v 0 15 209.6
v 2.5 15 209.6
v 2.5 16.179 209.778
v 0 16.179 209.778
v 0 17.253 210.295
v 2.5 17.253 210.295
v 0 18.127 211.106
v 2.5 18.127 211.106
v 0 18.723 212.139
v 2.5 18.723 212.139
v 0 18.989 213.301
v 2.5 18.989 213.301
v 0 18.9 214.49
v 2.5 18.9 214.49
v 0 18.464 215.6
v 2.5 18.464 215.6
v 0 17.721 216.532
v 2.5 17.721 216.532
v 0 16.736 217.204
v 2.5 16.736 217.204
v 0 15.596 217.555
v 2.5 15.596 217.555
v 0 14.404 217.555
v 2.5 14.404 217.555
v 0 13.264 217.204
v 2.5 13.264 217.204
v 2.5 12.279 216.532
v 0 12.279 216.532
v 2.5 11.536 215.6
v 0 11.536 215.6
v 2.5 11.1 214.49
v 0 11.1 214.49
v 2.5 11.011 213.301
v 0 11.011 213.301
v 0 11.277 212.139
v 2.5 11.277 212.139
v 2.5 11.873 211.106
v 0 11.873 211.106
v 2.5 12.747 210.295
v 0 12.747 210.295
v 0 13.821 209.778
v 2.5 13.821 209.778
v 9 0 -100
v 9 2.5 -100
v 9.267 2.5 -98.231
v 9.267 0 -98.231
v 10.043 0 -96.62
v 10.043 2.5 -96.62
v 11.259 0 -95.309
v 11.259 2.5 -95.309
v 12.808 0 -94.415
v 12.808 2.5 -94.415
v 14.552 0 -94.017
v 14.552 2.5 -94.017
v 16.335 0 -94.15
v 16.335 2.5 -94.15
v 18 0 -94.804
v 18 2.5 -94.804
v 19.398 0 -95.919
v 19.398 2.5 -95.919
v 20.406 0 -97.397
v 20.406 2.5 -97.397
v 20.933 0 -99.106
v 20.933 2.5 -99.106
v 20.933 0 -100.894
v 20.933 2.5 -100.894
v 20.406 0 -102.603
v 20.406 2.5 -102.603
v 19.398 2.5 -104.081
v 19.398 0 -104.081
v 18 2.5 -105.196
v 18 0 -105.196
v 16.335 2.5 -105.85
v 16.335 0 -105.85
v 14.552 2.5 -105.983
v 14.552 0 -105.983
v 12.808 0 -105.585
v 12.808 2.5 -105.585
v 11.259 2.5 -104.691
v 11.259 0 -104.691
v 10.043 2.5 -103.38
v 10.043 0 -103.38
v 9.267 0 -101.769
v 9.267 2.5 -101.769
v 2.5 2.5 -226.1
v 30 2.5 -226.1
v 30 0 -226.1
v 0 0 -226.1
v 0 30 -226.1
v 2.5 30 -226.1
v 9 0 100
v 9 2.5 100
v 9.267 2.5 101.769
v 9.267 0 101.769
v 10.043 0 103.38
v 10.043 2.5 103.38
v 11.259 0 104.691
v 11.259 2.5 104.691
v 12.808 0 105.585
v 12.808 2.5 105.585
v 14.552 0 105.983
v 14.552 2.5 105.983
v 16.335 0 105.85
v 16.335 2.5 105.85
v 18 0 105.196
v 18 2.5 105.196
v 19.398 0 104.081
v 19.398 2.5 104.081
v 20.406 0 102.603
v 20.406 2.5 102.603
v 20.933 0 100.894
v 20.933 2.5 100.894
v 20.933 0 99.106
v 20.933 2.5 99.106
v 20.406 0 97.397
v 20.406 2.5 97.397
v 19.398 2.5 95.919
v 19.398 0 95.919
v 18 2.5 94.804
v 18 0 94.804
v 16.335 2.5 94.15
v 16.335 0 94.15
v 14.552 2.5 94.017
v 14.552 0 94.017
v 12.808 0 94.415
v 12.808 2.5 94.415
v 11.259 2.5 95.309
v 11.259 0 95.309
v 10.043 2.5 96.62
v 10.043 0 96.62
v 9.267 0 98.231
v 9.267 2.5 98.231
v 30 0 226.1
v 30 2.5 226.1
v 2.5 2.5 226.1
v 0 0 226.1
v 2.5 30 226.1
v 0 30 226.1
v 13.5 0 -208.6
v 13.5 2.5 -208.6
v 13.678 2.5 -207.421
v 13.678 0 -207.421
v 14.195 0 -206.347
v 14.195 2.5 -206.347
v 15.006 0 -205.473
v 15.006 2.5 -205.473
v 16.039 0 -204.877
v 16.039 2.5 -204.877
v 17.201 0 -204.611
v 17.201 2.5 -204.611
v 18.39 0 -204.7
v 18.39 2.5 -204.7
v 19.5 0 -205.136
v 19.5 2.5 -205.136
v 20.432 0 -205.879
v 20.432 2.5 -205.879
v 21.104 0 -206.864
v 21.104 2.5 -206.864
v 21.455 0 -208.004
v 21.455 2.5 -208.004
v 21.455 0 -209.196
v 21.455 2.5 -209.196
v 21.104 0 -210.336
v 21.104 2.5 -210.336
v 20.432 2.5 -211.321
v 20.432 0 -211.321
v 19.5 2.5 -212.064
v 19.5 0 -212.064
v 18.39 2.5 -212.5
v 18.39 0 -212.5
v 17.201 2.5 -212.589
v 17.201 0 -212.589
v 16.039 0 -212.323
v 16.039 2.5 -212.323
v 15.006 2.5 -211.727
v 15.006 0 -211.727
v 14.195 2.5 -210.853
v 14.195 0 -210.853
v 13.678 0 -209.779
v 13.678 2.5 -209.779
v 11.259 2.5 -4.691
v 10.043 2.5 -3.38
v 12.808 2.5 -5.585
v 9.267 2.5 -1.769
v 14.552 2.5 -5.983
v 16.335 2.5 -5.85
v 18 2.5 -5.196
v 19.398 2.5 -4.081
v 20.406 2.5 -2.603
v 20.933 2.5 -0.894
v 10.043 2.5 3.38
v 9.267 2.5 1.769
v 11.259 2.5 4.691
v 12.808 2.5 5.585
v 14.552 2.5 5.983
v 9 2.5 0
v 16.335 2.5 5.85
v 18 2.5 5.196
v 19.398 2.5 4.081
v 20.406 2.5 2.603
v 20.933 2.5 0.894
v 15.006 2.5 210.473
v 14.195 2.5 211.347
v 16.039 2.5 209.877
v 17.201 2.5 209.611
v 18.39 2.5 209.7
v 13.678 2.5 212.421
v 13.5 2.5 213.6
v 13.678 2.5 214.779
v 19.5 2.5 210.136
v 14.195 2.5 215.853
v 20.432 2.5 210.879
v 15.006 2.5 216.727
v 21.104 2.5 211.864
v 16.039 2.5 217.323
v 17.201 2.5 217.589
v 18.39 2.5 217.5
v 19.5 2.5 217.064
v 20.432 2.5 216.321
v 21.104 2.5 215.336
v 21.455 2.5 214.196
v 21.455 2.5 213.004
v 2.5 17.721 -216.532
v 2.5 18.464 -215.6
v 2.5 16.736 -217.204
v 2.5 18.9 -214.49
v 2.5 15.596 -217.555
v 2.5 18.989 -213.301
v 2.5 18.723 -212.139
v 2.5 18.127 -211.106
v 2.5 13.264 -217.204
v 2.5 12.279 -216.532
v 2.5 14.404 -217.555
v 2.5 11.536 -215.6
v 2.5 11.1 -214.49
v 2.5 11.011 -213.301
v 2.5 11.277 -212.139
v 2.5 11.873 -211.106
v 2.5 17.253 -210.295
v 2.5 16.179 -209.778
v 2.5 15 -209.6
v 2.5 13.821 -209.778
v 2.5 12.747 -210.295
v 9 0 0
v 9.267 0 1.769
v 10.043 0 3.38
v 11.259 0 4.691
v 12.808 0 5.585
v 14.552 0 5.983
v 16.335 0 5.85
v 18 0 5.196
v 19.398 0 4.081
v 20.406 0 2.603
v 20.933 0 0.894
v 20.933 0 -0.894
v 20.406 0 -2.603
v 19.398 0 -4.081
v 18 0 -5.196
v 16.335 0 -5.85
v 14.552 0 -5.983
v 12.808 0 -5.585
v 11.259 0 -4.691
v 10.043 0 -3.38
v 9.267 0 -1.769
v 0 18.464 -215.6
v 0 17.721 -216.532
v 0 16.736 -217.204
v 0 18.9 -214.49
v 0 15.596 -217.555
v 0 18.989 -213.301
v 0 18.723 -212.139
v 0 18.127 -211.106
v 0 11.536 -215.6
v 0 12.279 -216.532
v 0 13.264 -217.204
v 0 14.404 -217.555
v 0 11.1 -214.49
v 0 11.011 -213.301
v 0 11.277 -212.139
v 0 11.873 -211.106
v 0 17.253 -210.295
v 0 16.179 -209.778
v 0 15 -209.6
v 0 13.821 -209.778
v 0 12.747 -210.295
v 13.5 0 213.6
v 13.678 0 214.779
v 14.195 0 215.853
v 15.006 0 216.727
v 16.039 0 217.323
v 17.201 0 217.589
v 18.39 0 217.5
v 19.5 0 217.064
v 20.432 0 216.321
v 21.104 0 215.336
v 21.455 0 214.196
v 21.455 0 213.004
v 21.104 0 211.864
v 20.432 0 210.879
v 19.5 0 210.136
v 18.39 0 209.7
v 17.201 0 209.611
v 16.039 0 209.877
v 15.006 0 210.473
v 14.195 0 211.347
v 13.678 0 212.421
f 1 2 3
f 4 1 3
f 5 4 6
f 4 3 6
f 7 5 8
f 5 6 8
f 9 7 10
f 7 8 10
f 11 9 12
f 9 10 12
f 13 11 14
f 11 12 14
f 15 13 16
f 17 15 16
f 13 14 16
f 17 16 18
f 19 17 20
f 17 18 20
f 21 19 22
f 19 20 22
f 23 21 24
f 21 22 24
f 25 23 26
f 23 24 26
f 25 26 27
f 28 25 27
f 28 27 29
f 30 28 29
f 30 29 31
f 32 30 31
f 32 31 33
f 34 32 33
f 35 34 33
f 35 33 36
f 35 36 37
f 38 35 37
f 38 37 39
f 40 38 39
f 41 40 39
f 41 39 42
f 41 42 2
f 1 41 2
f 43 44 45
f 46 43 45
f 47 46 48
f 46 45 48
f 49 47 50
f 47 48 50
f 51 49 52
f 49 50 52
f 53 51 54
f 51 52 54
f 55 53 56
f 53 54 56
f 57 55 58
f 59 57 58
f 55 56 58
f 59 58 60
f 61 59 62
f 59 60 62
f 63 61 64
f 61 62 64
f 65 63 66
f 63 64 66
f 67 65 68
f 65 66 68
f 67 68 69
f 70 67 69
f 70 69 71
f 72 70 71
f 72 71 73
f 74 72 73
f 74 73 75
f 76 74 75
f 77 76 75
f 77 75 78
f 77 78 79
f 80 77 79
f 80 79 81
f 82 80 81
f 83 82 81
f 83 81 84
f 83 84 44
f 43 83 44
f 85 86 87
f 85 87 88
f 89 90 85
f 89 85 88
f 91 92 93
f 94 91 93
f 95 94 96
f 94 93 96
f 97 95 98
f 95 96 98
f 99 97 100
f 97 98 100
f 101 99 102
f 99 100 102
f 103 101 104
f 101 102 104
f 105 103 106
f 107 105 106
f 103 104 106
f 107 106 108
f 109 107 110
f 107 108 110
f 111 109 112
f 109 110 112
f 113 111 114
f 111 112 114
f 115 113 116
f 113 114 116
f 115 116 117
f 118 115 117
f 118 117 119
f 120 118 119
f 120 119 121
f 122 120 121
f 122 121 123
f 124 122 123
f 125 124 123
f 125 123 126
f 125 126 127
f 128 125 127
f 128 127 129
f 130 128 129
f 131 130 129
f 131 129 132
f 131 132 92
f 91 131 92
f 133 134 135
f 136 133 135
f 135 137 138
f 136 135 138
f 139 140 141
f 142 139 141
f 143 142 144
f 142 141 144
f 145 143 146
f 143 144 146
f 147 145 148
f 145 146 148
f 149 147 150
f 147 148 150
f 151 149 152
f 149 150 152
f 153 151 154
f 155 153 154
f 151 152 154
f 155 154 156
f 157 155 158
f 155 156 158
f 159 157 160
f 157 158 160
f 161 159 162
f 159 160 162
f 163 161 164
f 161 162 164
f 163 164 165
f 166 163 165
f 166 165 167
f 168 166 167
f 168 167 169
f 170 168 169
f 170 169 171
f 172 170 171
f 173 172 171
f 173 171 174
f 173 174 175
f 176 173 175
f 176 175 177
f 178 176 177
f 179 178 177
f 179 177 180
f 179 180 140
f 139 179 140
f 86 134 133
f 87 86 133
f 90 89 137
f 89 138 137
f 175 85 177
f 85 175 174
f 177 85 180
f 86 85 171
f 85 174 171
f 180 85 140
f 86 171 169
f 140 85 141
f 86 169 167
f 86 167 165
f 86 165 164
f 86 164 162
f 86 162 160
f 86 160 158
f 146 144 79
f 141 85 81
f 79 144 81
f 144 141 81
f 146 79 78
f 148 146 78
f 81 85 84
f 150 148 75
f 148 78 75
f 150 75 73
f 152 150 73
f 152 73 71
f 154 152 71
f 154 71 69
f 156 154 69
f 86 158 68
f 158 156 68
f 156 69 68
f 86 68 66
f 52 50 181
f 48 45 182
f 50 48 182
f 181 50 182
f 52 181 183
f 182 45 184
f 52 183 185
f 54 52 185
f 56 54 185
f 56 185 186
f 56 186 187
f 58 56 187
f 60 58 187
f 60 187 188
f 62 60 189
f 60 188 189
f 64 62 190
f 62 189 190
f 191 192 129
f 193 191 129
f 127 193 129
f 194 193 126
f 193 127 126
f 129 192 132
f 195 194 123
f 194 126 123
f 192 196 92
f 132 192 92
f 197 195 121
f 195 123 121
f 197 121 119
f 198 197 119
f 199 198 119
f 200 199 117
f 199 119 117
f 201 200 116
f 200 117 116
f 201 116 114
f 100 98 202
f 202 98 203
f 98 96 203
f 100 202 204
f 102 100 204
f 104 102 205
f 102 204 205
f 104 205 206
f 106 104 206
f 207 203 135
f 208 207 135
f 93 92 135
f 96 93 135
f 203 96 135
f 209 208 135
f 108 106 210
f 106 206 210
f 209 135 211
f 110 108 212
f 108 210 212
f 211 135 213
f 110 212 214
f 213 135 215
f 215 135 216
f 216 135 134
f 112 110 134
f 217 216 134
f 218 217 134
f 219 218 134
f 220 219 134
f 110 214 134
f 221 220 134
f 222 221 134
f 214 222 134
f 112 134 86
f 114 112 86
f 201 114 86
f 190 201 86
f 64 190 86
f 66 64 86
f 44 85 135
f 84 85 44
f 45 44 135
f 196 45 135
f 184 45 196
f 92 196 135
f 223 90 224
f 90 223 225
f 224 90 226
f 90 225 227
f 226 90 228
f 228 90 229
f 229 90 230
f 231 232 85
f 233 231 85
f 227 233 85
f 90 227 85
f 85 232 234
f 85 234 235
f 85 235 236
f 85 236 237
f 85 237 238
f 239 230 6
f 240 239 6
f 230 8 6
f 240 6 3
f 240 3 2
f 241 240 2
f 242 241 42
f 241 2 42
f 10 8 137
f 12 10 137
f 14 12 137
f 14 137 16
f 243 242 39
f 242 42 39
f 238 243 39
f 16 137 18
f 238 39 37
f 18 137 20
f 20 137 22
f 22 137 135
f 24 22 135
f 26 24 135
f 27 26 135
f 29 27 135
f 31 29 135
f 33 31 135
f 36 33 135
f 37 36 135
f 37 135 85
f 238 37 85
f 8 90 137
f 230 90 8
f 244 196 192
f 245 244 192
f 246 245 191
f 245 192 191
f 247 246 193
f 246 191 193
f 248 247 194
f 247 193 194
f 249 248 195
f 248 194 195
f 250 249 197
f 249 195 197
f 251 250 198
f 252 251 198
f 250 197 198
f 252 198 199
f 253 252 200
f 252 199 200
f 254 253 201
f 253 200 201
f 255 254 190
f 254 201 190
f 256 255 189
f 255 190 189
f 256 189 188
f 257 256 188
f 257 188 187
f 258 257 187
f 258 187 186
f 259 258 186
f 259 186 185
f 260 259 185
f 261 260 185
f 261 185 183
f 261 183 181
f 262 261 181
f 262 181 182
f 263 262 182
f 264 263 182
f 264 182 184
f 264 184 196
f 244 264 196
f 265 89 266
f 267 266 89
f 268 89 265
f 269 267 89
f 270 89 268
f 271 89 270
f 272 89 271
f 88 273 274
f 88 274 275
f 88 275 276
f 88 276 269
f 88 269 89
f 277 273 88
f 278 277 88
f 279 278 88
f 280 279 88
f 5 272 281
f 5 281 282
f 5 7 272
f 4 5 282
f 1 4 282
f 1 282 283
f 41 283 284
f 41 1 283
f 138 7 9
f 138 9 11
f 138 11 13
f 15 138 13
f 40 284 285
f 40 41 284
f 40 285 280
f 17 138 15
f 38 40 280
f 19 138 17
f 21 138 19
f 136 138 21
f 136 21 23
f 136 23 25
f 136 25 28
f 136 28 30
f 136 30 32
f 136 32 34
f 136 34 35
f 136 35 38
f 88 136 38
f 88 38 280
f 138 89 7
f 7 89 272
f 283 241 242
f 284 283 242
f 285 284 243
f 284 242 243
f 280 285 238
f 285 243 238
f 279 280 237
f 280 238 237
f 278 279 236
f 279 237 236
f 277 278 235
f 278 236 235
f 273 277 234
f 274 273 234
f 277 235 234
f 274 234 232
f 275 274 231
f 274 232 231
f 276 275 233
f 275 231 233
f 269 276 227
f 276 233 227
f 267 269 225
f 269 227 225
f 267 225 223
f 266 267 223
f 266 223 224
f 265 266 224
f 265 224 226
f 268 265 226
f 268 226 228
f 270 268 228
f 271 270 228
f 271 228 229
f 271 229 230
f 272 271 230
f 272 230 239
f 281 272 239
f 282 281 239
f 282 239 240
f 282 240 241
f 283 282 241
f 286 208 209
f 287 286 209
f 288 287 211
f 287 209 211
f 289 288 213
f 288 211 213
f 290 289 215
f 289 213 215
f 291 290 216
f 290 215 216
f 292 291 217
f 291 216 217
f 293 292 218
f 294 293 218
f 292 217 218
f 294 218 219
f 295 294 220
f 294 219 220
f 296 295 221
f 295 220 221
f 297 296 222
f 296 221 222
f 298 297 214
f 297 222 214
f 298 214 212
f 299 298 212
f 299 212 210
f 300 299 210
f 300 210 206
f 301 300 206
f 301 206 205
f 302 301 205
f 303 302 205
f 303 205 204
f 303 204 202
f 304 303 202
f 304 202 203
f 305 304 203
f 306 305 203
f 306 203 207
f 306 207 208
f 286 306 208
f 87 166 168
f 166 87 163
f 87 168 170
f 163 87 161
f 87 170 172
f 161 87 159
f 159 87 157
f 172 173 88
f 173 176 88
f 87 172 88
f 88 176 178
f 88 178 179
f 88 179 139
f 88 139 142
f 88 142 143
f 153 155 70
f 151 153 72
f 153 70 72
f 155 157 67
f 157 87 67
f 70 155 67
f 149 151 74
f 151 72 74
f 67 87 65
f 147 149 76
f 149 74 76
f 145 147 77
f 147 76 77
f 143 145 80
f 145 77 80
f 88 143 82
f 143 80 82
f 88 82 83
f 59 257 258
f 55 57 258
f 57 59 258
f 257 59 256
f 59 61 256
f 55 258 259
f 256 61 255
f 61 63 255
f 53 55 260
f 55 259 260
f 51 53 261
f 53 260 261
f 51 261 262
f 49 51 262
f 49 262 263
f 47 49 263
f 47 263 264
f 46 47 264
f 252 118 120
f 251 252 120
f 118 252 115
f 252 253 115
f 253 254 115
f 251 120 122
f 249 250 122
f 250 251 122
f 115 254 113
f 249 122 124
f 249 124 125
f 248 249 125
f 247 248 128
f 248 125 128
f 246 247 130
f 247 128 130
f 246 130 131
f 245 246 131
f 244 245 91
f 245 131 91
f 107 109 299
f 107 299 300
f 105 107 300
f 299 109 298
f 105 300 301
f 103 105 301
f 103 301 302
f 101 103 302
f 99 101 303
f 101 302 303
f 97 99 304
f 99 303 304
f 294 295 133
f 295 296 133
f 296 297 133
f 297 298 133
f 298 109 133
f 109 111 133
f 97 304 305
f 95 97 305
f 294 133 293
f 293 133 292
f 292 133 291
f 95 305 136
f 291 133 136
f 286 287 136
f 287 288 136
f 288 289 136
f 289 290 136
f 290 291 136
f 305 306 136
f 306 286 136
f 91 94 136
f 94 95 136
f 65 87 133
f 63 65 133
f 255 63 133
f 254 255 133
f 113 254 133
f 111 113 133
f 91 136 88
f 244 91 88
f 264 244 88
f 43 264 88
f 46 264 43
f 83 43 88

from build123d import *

# Parameters (mm, degrees)
BOSS_EXTRUDE1_DEPTH = 226.1
SKETCH2_R           = 4
SKETCH2_R_2         = 6
CUT_EXTRUDE1_DEPTH  = 230.733454246
SKETCH3_R           = 4
CUT_EXTRUDE2_DEPTH  = 230.733454246


with BuildPart() as part:
    # Sketch1 → Boss-Extrude1 (new, symmetric)
    with BuildSketch(Plane.XY):
        Polygon((0, 2.5), (0, 30), (2.5, 30), (2.5, 2.5), (30, 2.5), (30, 0), (0, 0), align=None)
    extrude(amount=BOSS_EXTRUDE1_DEPTH, both=True)

    # Sketch2 → Cut-Extrude1 (cut, through all)
    with BuildSketch(Plane(origin=(0, 2.5, 0), x_dir=(1, 0, 0), z_dir=(0, 1, 0))):
        with Locations(Location((17.5, 208.6, 0), (0, 0, 180))):
            Circle(SKETCH2_R)
        with Locations(Location((17.5, -213.6, 0), (0, 0, 180))):
            Circle(SKETCH2_R)
        with Locations(Location((15, -100, 0), (0, 0, 180))):
            Circle(SKETCH2_R_2)
        with Locations(Location((15, 100, 0), (0, 0, 180))):
            Circle(SKETCH2_R_2)
        with Locations(Location((15, 0, 0), (0, 0, 180))):
            Circle(SKETCH2_R_2)
    extrude(amount=-CUT_EXTRUDE1_DEPTH, mode=Mode.SUBTRACT)

    # Sketch3 → Cut-Extrude2 (cut, through all)
    with BuildSketch(Plane(origin=(2.5, 0, 0), x_dir=(0, 0, -1), z_dir=(1, 0, 0))):
        with Locations((-213.6, 15)):
            Circle(SKETCH3_R)
        with Locations(Location((213.6, 15, 0), (0, 0, 180))):
            Circle(SKETCH3_R)
    extrude(amount=-CUT_EXTRUDE2_DEPTH, mode=Mode.SUBTRACT)


solid = part.part
